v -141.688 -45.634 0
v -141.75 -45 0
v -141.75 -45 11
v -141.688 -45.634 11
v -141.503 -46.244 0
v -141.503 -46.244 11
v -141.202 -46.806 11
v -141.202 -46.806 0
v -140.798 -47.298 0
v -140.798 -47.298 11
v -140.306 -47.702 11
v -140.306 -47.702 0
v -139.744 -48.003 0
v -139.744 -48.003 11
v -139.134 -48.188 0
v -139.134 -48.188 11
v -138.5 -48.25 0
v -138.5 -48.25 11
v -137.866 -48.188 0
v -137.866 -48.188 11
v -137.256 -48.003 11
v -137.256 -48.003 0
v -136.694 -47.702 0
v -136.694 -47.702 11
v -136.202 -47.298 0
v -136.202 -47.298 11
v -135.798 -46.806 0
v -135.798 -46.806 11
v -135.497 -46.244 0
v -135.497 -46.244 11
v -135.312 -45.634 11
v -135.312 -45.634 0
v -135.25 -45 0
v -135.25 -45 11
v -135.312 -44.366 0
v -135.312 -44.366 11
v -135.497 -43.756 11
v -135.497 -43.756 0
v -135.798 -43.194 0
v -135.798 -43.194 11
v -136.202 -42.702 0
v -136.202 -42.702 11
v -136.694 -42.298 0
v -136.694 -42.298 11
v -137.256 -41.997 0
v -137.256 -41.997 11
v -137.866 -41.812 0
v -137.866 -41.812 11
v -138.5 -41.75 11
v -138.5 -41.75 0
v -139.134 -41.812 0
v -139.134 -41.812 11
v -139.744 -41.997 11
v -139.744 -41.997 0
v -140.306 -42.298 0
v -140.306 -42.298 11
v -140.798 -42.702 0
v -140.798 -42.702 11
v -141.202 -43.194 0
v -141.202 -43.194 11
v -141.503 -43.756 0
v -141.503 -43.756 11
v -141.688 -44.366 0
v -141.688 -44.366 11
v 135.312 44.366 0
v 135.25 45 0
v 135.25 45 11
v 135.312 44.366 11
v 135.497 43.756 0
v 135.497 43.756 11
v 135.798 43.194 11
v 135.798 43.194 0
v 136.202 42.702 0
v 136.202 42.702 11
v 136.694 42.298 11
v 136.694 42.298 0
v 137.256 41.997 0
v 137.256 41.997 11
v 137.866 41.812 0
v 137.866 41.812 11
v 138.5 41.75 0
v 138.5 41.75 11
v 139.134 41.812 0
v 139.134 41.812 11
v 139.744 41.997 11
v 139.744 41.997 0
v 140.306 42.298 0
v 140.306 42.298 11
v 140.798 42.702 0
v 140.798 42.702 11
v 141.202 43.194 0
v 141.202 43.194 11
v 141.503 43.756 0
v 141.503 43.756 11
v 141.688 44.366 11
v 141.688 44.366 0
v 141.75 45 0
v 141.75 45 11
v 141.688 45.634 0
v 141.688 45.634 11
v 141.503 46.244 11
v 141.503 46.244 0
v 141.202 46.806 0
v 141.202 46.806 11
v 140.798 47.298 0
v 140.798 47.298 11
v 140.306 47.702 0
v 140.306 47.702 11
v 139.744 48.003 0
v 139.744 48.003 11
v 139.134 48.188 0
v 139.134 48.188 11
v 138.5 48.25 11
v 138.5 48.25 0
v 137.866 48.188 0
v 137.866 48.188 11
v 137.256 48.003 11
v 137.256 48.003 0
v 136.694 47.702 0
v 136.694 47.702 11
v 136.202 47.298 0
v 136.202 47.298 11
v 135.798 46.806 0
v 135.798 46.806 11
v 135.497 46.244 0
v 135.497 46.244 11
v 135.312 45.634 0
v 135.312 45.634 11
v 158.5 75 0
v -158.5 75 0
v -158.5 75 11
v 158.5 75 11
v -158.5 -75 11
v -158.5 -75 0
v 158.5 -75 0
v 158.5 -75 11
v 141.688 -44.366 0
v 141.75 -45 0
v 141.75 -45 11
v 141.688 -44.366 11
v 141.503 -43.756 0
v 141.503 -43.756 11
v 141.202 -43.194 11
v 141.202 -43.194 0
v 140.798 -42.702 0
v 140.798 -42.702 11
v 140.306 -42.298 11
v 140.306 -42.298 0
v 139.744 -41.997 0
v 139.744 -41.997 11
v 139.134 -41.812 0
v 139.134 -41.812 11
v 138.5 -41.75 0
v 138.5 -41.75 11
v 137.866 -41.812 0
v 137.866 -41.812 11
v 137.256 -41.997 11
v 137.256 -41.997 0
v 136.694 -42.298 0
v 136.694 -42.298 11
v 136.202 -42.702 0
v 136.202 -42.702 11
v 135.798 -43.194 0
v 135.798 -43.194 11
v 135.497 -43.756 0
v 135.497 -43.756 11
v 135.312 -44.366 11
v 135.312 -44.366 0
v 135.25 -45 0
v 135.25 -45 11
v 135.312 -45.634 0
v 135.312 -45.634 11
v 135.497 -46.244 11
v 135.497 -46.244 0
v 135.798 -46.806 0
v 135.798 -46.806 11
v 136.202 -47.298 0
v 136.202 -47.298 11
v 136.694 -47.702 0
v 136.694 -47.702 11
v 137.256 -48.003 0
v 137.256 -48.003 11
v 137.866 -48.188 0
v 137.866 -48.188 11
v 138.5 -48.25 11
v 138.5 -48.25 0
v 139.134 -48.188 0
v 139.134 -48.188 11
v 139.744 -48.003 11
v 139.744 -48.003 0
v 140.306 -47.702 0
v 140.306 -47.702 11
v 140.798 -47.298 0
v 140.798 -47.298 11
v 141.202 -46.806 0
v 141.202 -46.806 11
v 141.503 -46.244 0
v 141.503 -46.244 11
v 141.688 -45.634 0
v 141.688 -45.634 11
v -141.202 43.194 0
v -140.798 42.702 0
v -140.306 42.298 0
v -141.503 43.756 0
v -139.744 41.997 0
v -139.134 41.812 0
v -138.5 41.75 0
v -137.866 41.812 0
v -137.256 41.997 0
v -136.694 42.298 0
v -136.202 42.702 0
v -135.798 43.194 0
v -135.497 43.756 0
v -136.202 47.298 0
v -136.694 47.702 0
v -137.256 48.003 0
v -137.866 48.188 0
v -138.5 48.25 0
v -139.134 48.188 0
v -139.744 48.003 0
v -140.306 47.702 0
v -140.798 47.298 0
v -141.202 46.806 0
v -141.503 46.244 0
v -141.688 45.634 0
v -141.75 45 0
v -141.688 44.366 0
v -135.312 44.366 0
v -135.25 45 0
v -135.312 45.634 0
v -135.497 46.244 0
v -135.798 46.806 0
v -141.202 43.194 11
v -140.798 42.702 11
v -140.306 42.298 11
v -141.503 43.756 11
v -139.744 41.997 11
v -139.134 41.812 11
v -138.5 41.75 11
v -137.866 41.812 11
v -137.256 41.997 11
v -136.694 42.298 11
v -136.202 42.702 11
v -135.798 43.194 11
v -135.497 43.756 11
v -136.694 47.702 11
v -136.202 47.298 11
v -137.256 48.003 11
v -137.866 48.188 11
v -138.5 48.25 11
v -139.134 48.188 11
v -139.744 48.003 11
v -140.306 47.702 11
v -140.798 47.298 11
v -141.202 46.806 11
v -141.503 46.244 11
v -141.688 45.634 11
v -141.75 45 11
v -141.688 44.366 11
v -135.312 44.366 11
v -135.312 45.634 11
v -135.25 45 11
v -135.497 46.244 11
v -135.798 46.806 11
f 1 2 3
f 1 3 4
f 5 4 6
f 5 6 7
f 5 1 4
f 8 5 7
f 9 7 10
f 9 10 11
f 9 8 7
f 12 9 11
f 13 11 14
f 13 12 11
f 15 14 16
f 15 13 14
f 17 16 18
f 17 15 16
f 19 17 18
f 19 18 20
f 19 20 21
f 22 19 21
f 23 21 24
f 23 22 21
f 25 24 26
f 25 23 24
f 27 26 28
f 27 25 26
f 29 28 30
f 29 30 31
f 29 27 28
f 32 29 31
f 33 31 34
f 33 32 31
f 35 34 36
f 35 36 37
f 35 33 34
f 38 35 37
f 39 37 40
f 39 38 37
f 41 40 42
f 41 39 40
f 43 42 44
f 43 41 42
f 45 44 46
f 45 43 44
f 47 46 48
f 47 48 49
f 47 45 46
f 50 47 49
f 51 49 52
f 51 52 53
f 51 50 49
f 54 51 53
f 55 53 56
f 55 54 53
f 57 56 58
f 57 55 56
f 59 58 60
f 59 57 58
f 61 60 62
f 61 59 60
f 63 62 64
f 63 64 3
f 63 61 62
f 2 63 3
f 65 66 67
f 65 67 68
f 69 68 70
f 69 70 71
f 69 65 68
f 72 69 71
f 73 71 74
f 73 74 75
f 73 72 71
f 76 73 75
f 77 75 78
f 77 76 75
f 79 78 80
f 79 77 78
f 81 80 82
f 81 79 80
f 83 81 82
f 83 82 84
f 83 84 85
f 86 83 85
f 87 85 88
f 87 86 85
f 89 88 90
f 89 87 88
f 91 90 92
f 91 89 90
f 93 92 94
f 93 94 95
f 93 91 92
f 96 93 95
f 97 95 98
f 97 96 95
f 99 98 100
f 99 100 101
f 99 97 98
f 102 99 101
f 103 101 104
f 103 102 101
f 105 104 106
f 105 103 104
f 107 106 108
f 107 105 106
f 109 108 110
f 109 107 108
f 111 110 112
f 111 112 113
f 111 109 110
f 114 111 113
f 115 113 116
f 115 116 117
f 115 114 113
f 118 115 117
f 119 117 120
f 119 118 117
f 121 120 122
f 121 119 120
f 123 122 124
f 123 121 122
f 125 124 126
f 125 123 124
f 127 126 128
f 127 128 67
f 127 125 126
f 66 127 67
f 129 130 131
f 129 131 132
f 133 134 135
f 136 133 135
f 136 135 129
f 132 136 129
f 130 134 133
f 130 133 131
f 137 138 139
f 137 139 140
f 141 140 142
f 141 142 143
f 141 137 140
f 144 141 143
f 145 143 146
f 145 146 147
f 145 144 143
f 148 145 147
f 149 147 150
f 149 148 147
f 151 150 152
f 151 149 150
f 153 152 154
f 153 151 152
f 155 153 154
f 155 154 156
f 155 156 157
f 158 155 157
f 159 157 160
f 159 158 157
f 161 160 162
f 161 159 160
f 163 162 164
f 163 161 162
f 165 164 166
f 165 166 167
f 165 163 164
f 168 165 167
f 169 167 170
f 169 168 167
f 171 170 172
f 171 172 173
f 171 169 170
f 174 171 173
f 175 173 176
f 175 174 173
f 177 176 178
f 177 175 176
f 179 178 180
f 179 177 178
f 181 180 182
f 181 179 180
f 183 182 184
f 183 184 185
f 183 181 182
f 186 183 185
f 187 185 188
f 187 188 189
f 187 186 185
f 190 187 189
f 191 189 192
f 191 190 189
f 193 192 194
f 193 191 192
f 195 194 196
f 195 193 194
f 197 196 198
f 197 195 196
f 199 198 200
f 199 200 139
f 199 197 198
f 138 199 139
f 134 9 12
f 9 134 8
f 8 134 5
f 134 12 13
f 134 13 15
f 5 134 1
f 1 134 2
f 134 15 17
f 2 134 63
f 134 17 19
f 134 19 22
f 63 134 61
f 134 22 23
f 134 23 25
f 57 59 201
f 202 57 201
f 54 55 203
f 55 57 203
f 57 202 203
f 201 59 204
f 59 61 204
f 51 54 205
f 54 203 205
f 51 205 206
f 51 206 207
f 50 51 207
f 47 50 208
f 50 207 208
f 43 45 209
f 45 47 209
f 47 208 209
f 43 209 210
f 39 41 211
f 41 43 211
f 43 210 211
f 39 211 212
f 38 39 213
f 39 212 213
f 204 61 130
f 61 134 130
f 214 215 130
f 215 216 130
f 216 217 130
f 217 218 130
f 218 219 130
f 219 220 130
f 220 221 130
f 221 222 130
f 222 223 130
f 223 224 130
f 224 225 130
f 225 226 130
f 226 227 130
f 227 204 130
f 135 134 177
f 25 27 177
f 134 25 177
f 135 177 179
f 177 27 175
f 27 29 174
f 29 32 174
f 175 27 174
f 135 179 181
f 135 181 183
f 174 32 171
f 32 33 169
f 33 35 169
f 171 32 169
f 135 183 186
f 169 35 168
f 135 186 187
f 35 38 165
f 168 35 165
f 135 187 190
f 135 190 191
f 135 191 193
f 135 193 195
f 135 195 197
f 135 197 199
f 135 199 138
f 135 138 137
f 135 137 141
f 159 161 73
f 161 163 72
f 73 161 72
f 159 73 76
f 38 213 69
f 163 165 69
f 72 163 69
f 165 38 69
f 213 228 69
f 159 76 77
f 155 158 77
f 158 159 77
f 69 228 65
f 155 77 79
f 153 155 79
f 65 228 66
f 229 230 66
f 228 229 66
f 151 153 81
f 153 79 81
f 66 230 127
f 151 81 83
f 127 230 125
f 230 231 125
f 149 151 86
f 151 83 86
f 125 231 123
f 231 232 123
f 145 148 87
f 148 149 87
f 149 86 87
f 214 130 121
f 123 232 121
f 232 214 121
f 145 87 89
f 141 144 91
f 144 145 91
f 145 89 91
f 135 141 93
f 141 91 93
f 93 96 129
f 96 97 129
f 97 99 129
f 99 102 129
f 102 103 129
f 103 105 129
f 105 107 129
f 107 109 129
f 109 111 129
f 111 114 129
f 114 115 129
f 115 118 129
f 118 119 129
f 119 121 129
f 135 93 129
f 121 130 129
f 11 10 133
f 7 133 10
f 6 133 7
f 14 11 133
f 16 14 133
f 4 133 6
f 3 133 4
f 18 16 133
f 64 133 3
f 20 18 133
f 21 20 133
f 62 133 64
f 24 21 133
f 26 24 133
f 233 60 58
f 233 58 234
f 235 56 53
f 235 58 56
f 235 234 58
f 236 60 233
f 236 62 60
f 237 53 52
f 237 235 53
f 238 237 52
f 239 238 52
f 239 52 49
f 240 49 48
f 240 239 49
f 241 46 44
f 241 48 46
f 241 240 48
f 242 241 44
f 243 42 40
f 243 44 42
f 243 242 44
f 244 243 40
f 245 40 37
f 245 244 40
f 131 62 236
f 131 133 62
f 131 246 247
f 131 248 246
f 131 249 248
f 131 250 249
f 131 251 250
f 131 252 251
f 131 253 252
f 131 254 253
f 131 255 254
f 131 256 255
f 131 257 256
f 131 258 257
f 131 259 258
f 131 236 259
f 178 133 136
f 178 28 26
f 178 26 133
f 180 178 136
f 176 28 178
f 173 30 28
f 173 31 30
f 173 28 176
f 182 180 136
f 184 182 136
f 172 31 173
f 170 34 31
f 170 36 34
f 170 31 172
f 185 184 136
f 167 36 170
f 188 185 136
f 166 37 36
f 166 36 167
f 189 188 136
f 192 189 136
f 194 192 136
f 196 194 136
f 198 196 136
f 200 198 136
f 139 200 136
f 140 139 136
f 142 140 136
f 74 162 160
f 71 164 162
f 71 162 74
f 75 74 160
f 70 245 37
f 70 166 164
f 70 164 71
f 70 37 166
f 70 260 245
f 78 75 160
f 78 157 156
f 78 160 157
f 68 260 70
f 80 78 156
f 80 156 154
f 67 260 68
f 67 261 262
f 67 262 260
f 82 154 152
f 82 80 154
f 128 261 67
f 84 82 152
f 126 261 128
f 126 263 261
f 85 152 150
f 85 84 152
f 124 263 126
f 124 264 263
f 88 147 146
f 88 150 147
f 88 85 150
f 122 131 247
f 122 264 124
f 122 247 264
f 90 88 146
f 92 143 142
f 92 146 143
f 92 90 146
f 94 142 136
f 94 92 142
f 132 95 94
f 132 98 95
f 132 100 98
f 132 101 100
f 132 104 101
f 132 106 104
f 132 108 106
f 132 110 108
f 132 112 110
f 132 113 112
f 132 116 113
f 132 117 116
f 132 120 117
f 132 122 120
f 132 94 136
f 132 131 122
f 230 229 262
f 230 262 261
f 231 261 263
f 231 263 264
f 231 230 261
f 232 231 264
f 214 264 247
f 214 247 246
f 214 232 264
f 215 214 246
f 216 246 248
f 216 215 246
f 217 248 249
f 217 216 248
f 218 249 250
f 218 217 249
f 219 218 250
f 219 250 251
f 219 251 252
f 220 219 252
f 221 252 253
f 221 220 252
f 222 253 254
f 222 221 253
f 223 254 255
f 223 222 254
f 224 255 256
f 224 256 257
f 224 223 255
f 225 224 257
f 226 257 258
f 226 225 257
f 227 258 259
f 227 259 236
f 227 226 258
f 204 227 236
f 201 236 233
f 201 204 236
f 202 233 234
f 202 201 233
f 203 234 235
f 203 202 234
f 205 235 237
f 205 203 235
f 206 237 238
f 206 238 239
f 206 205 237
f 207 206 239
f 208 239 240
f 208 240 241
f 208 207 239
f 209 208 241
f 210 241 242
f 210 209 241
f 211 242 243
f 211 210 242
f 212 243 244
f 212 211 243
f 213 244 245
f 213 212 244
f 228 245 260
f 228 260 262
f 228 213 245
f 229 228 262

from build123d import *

# Parameters (mm, degrees)
SKETCH2_W           = 317
SKETCH2_H           = 150
SKETCH2_R           = 3.25
BOSS_EXTRUDE1_DEPTH = 11


with BuildPart() as part:
    # Sketch2 → Boss-Extrude1 (new body)
    with BuildSketch(Plane.XY):
        Rectangle(SKETCH2_W, SKETCH2_H)
        with Locations((-138.5, 45)):
            Circle(SKETCH2_R, mode=Mode.SUBTRACT)
        with Locations(Location((138.5, 45, 0), (0, 0, 180))):
            Circle(SKETCH2_R, mode=Mode.SUBTRACT)
        with Locations((138.5, -45)):
            Circle(SKETCH2_R, mode=Mode.SUBTRACT)
        with Locations(Location((-138.5, -45, 0), (0, 0, 180))):
            Circle(SKETCH2_R, mode=Mode.SUBTRACT)
    extrude(amount=BOSS_EXTRUDE1_DEPTH)


solid = part.part
